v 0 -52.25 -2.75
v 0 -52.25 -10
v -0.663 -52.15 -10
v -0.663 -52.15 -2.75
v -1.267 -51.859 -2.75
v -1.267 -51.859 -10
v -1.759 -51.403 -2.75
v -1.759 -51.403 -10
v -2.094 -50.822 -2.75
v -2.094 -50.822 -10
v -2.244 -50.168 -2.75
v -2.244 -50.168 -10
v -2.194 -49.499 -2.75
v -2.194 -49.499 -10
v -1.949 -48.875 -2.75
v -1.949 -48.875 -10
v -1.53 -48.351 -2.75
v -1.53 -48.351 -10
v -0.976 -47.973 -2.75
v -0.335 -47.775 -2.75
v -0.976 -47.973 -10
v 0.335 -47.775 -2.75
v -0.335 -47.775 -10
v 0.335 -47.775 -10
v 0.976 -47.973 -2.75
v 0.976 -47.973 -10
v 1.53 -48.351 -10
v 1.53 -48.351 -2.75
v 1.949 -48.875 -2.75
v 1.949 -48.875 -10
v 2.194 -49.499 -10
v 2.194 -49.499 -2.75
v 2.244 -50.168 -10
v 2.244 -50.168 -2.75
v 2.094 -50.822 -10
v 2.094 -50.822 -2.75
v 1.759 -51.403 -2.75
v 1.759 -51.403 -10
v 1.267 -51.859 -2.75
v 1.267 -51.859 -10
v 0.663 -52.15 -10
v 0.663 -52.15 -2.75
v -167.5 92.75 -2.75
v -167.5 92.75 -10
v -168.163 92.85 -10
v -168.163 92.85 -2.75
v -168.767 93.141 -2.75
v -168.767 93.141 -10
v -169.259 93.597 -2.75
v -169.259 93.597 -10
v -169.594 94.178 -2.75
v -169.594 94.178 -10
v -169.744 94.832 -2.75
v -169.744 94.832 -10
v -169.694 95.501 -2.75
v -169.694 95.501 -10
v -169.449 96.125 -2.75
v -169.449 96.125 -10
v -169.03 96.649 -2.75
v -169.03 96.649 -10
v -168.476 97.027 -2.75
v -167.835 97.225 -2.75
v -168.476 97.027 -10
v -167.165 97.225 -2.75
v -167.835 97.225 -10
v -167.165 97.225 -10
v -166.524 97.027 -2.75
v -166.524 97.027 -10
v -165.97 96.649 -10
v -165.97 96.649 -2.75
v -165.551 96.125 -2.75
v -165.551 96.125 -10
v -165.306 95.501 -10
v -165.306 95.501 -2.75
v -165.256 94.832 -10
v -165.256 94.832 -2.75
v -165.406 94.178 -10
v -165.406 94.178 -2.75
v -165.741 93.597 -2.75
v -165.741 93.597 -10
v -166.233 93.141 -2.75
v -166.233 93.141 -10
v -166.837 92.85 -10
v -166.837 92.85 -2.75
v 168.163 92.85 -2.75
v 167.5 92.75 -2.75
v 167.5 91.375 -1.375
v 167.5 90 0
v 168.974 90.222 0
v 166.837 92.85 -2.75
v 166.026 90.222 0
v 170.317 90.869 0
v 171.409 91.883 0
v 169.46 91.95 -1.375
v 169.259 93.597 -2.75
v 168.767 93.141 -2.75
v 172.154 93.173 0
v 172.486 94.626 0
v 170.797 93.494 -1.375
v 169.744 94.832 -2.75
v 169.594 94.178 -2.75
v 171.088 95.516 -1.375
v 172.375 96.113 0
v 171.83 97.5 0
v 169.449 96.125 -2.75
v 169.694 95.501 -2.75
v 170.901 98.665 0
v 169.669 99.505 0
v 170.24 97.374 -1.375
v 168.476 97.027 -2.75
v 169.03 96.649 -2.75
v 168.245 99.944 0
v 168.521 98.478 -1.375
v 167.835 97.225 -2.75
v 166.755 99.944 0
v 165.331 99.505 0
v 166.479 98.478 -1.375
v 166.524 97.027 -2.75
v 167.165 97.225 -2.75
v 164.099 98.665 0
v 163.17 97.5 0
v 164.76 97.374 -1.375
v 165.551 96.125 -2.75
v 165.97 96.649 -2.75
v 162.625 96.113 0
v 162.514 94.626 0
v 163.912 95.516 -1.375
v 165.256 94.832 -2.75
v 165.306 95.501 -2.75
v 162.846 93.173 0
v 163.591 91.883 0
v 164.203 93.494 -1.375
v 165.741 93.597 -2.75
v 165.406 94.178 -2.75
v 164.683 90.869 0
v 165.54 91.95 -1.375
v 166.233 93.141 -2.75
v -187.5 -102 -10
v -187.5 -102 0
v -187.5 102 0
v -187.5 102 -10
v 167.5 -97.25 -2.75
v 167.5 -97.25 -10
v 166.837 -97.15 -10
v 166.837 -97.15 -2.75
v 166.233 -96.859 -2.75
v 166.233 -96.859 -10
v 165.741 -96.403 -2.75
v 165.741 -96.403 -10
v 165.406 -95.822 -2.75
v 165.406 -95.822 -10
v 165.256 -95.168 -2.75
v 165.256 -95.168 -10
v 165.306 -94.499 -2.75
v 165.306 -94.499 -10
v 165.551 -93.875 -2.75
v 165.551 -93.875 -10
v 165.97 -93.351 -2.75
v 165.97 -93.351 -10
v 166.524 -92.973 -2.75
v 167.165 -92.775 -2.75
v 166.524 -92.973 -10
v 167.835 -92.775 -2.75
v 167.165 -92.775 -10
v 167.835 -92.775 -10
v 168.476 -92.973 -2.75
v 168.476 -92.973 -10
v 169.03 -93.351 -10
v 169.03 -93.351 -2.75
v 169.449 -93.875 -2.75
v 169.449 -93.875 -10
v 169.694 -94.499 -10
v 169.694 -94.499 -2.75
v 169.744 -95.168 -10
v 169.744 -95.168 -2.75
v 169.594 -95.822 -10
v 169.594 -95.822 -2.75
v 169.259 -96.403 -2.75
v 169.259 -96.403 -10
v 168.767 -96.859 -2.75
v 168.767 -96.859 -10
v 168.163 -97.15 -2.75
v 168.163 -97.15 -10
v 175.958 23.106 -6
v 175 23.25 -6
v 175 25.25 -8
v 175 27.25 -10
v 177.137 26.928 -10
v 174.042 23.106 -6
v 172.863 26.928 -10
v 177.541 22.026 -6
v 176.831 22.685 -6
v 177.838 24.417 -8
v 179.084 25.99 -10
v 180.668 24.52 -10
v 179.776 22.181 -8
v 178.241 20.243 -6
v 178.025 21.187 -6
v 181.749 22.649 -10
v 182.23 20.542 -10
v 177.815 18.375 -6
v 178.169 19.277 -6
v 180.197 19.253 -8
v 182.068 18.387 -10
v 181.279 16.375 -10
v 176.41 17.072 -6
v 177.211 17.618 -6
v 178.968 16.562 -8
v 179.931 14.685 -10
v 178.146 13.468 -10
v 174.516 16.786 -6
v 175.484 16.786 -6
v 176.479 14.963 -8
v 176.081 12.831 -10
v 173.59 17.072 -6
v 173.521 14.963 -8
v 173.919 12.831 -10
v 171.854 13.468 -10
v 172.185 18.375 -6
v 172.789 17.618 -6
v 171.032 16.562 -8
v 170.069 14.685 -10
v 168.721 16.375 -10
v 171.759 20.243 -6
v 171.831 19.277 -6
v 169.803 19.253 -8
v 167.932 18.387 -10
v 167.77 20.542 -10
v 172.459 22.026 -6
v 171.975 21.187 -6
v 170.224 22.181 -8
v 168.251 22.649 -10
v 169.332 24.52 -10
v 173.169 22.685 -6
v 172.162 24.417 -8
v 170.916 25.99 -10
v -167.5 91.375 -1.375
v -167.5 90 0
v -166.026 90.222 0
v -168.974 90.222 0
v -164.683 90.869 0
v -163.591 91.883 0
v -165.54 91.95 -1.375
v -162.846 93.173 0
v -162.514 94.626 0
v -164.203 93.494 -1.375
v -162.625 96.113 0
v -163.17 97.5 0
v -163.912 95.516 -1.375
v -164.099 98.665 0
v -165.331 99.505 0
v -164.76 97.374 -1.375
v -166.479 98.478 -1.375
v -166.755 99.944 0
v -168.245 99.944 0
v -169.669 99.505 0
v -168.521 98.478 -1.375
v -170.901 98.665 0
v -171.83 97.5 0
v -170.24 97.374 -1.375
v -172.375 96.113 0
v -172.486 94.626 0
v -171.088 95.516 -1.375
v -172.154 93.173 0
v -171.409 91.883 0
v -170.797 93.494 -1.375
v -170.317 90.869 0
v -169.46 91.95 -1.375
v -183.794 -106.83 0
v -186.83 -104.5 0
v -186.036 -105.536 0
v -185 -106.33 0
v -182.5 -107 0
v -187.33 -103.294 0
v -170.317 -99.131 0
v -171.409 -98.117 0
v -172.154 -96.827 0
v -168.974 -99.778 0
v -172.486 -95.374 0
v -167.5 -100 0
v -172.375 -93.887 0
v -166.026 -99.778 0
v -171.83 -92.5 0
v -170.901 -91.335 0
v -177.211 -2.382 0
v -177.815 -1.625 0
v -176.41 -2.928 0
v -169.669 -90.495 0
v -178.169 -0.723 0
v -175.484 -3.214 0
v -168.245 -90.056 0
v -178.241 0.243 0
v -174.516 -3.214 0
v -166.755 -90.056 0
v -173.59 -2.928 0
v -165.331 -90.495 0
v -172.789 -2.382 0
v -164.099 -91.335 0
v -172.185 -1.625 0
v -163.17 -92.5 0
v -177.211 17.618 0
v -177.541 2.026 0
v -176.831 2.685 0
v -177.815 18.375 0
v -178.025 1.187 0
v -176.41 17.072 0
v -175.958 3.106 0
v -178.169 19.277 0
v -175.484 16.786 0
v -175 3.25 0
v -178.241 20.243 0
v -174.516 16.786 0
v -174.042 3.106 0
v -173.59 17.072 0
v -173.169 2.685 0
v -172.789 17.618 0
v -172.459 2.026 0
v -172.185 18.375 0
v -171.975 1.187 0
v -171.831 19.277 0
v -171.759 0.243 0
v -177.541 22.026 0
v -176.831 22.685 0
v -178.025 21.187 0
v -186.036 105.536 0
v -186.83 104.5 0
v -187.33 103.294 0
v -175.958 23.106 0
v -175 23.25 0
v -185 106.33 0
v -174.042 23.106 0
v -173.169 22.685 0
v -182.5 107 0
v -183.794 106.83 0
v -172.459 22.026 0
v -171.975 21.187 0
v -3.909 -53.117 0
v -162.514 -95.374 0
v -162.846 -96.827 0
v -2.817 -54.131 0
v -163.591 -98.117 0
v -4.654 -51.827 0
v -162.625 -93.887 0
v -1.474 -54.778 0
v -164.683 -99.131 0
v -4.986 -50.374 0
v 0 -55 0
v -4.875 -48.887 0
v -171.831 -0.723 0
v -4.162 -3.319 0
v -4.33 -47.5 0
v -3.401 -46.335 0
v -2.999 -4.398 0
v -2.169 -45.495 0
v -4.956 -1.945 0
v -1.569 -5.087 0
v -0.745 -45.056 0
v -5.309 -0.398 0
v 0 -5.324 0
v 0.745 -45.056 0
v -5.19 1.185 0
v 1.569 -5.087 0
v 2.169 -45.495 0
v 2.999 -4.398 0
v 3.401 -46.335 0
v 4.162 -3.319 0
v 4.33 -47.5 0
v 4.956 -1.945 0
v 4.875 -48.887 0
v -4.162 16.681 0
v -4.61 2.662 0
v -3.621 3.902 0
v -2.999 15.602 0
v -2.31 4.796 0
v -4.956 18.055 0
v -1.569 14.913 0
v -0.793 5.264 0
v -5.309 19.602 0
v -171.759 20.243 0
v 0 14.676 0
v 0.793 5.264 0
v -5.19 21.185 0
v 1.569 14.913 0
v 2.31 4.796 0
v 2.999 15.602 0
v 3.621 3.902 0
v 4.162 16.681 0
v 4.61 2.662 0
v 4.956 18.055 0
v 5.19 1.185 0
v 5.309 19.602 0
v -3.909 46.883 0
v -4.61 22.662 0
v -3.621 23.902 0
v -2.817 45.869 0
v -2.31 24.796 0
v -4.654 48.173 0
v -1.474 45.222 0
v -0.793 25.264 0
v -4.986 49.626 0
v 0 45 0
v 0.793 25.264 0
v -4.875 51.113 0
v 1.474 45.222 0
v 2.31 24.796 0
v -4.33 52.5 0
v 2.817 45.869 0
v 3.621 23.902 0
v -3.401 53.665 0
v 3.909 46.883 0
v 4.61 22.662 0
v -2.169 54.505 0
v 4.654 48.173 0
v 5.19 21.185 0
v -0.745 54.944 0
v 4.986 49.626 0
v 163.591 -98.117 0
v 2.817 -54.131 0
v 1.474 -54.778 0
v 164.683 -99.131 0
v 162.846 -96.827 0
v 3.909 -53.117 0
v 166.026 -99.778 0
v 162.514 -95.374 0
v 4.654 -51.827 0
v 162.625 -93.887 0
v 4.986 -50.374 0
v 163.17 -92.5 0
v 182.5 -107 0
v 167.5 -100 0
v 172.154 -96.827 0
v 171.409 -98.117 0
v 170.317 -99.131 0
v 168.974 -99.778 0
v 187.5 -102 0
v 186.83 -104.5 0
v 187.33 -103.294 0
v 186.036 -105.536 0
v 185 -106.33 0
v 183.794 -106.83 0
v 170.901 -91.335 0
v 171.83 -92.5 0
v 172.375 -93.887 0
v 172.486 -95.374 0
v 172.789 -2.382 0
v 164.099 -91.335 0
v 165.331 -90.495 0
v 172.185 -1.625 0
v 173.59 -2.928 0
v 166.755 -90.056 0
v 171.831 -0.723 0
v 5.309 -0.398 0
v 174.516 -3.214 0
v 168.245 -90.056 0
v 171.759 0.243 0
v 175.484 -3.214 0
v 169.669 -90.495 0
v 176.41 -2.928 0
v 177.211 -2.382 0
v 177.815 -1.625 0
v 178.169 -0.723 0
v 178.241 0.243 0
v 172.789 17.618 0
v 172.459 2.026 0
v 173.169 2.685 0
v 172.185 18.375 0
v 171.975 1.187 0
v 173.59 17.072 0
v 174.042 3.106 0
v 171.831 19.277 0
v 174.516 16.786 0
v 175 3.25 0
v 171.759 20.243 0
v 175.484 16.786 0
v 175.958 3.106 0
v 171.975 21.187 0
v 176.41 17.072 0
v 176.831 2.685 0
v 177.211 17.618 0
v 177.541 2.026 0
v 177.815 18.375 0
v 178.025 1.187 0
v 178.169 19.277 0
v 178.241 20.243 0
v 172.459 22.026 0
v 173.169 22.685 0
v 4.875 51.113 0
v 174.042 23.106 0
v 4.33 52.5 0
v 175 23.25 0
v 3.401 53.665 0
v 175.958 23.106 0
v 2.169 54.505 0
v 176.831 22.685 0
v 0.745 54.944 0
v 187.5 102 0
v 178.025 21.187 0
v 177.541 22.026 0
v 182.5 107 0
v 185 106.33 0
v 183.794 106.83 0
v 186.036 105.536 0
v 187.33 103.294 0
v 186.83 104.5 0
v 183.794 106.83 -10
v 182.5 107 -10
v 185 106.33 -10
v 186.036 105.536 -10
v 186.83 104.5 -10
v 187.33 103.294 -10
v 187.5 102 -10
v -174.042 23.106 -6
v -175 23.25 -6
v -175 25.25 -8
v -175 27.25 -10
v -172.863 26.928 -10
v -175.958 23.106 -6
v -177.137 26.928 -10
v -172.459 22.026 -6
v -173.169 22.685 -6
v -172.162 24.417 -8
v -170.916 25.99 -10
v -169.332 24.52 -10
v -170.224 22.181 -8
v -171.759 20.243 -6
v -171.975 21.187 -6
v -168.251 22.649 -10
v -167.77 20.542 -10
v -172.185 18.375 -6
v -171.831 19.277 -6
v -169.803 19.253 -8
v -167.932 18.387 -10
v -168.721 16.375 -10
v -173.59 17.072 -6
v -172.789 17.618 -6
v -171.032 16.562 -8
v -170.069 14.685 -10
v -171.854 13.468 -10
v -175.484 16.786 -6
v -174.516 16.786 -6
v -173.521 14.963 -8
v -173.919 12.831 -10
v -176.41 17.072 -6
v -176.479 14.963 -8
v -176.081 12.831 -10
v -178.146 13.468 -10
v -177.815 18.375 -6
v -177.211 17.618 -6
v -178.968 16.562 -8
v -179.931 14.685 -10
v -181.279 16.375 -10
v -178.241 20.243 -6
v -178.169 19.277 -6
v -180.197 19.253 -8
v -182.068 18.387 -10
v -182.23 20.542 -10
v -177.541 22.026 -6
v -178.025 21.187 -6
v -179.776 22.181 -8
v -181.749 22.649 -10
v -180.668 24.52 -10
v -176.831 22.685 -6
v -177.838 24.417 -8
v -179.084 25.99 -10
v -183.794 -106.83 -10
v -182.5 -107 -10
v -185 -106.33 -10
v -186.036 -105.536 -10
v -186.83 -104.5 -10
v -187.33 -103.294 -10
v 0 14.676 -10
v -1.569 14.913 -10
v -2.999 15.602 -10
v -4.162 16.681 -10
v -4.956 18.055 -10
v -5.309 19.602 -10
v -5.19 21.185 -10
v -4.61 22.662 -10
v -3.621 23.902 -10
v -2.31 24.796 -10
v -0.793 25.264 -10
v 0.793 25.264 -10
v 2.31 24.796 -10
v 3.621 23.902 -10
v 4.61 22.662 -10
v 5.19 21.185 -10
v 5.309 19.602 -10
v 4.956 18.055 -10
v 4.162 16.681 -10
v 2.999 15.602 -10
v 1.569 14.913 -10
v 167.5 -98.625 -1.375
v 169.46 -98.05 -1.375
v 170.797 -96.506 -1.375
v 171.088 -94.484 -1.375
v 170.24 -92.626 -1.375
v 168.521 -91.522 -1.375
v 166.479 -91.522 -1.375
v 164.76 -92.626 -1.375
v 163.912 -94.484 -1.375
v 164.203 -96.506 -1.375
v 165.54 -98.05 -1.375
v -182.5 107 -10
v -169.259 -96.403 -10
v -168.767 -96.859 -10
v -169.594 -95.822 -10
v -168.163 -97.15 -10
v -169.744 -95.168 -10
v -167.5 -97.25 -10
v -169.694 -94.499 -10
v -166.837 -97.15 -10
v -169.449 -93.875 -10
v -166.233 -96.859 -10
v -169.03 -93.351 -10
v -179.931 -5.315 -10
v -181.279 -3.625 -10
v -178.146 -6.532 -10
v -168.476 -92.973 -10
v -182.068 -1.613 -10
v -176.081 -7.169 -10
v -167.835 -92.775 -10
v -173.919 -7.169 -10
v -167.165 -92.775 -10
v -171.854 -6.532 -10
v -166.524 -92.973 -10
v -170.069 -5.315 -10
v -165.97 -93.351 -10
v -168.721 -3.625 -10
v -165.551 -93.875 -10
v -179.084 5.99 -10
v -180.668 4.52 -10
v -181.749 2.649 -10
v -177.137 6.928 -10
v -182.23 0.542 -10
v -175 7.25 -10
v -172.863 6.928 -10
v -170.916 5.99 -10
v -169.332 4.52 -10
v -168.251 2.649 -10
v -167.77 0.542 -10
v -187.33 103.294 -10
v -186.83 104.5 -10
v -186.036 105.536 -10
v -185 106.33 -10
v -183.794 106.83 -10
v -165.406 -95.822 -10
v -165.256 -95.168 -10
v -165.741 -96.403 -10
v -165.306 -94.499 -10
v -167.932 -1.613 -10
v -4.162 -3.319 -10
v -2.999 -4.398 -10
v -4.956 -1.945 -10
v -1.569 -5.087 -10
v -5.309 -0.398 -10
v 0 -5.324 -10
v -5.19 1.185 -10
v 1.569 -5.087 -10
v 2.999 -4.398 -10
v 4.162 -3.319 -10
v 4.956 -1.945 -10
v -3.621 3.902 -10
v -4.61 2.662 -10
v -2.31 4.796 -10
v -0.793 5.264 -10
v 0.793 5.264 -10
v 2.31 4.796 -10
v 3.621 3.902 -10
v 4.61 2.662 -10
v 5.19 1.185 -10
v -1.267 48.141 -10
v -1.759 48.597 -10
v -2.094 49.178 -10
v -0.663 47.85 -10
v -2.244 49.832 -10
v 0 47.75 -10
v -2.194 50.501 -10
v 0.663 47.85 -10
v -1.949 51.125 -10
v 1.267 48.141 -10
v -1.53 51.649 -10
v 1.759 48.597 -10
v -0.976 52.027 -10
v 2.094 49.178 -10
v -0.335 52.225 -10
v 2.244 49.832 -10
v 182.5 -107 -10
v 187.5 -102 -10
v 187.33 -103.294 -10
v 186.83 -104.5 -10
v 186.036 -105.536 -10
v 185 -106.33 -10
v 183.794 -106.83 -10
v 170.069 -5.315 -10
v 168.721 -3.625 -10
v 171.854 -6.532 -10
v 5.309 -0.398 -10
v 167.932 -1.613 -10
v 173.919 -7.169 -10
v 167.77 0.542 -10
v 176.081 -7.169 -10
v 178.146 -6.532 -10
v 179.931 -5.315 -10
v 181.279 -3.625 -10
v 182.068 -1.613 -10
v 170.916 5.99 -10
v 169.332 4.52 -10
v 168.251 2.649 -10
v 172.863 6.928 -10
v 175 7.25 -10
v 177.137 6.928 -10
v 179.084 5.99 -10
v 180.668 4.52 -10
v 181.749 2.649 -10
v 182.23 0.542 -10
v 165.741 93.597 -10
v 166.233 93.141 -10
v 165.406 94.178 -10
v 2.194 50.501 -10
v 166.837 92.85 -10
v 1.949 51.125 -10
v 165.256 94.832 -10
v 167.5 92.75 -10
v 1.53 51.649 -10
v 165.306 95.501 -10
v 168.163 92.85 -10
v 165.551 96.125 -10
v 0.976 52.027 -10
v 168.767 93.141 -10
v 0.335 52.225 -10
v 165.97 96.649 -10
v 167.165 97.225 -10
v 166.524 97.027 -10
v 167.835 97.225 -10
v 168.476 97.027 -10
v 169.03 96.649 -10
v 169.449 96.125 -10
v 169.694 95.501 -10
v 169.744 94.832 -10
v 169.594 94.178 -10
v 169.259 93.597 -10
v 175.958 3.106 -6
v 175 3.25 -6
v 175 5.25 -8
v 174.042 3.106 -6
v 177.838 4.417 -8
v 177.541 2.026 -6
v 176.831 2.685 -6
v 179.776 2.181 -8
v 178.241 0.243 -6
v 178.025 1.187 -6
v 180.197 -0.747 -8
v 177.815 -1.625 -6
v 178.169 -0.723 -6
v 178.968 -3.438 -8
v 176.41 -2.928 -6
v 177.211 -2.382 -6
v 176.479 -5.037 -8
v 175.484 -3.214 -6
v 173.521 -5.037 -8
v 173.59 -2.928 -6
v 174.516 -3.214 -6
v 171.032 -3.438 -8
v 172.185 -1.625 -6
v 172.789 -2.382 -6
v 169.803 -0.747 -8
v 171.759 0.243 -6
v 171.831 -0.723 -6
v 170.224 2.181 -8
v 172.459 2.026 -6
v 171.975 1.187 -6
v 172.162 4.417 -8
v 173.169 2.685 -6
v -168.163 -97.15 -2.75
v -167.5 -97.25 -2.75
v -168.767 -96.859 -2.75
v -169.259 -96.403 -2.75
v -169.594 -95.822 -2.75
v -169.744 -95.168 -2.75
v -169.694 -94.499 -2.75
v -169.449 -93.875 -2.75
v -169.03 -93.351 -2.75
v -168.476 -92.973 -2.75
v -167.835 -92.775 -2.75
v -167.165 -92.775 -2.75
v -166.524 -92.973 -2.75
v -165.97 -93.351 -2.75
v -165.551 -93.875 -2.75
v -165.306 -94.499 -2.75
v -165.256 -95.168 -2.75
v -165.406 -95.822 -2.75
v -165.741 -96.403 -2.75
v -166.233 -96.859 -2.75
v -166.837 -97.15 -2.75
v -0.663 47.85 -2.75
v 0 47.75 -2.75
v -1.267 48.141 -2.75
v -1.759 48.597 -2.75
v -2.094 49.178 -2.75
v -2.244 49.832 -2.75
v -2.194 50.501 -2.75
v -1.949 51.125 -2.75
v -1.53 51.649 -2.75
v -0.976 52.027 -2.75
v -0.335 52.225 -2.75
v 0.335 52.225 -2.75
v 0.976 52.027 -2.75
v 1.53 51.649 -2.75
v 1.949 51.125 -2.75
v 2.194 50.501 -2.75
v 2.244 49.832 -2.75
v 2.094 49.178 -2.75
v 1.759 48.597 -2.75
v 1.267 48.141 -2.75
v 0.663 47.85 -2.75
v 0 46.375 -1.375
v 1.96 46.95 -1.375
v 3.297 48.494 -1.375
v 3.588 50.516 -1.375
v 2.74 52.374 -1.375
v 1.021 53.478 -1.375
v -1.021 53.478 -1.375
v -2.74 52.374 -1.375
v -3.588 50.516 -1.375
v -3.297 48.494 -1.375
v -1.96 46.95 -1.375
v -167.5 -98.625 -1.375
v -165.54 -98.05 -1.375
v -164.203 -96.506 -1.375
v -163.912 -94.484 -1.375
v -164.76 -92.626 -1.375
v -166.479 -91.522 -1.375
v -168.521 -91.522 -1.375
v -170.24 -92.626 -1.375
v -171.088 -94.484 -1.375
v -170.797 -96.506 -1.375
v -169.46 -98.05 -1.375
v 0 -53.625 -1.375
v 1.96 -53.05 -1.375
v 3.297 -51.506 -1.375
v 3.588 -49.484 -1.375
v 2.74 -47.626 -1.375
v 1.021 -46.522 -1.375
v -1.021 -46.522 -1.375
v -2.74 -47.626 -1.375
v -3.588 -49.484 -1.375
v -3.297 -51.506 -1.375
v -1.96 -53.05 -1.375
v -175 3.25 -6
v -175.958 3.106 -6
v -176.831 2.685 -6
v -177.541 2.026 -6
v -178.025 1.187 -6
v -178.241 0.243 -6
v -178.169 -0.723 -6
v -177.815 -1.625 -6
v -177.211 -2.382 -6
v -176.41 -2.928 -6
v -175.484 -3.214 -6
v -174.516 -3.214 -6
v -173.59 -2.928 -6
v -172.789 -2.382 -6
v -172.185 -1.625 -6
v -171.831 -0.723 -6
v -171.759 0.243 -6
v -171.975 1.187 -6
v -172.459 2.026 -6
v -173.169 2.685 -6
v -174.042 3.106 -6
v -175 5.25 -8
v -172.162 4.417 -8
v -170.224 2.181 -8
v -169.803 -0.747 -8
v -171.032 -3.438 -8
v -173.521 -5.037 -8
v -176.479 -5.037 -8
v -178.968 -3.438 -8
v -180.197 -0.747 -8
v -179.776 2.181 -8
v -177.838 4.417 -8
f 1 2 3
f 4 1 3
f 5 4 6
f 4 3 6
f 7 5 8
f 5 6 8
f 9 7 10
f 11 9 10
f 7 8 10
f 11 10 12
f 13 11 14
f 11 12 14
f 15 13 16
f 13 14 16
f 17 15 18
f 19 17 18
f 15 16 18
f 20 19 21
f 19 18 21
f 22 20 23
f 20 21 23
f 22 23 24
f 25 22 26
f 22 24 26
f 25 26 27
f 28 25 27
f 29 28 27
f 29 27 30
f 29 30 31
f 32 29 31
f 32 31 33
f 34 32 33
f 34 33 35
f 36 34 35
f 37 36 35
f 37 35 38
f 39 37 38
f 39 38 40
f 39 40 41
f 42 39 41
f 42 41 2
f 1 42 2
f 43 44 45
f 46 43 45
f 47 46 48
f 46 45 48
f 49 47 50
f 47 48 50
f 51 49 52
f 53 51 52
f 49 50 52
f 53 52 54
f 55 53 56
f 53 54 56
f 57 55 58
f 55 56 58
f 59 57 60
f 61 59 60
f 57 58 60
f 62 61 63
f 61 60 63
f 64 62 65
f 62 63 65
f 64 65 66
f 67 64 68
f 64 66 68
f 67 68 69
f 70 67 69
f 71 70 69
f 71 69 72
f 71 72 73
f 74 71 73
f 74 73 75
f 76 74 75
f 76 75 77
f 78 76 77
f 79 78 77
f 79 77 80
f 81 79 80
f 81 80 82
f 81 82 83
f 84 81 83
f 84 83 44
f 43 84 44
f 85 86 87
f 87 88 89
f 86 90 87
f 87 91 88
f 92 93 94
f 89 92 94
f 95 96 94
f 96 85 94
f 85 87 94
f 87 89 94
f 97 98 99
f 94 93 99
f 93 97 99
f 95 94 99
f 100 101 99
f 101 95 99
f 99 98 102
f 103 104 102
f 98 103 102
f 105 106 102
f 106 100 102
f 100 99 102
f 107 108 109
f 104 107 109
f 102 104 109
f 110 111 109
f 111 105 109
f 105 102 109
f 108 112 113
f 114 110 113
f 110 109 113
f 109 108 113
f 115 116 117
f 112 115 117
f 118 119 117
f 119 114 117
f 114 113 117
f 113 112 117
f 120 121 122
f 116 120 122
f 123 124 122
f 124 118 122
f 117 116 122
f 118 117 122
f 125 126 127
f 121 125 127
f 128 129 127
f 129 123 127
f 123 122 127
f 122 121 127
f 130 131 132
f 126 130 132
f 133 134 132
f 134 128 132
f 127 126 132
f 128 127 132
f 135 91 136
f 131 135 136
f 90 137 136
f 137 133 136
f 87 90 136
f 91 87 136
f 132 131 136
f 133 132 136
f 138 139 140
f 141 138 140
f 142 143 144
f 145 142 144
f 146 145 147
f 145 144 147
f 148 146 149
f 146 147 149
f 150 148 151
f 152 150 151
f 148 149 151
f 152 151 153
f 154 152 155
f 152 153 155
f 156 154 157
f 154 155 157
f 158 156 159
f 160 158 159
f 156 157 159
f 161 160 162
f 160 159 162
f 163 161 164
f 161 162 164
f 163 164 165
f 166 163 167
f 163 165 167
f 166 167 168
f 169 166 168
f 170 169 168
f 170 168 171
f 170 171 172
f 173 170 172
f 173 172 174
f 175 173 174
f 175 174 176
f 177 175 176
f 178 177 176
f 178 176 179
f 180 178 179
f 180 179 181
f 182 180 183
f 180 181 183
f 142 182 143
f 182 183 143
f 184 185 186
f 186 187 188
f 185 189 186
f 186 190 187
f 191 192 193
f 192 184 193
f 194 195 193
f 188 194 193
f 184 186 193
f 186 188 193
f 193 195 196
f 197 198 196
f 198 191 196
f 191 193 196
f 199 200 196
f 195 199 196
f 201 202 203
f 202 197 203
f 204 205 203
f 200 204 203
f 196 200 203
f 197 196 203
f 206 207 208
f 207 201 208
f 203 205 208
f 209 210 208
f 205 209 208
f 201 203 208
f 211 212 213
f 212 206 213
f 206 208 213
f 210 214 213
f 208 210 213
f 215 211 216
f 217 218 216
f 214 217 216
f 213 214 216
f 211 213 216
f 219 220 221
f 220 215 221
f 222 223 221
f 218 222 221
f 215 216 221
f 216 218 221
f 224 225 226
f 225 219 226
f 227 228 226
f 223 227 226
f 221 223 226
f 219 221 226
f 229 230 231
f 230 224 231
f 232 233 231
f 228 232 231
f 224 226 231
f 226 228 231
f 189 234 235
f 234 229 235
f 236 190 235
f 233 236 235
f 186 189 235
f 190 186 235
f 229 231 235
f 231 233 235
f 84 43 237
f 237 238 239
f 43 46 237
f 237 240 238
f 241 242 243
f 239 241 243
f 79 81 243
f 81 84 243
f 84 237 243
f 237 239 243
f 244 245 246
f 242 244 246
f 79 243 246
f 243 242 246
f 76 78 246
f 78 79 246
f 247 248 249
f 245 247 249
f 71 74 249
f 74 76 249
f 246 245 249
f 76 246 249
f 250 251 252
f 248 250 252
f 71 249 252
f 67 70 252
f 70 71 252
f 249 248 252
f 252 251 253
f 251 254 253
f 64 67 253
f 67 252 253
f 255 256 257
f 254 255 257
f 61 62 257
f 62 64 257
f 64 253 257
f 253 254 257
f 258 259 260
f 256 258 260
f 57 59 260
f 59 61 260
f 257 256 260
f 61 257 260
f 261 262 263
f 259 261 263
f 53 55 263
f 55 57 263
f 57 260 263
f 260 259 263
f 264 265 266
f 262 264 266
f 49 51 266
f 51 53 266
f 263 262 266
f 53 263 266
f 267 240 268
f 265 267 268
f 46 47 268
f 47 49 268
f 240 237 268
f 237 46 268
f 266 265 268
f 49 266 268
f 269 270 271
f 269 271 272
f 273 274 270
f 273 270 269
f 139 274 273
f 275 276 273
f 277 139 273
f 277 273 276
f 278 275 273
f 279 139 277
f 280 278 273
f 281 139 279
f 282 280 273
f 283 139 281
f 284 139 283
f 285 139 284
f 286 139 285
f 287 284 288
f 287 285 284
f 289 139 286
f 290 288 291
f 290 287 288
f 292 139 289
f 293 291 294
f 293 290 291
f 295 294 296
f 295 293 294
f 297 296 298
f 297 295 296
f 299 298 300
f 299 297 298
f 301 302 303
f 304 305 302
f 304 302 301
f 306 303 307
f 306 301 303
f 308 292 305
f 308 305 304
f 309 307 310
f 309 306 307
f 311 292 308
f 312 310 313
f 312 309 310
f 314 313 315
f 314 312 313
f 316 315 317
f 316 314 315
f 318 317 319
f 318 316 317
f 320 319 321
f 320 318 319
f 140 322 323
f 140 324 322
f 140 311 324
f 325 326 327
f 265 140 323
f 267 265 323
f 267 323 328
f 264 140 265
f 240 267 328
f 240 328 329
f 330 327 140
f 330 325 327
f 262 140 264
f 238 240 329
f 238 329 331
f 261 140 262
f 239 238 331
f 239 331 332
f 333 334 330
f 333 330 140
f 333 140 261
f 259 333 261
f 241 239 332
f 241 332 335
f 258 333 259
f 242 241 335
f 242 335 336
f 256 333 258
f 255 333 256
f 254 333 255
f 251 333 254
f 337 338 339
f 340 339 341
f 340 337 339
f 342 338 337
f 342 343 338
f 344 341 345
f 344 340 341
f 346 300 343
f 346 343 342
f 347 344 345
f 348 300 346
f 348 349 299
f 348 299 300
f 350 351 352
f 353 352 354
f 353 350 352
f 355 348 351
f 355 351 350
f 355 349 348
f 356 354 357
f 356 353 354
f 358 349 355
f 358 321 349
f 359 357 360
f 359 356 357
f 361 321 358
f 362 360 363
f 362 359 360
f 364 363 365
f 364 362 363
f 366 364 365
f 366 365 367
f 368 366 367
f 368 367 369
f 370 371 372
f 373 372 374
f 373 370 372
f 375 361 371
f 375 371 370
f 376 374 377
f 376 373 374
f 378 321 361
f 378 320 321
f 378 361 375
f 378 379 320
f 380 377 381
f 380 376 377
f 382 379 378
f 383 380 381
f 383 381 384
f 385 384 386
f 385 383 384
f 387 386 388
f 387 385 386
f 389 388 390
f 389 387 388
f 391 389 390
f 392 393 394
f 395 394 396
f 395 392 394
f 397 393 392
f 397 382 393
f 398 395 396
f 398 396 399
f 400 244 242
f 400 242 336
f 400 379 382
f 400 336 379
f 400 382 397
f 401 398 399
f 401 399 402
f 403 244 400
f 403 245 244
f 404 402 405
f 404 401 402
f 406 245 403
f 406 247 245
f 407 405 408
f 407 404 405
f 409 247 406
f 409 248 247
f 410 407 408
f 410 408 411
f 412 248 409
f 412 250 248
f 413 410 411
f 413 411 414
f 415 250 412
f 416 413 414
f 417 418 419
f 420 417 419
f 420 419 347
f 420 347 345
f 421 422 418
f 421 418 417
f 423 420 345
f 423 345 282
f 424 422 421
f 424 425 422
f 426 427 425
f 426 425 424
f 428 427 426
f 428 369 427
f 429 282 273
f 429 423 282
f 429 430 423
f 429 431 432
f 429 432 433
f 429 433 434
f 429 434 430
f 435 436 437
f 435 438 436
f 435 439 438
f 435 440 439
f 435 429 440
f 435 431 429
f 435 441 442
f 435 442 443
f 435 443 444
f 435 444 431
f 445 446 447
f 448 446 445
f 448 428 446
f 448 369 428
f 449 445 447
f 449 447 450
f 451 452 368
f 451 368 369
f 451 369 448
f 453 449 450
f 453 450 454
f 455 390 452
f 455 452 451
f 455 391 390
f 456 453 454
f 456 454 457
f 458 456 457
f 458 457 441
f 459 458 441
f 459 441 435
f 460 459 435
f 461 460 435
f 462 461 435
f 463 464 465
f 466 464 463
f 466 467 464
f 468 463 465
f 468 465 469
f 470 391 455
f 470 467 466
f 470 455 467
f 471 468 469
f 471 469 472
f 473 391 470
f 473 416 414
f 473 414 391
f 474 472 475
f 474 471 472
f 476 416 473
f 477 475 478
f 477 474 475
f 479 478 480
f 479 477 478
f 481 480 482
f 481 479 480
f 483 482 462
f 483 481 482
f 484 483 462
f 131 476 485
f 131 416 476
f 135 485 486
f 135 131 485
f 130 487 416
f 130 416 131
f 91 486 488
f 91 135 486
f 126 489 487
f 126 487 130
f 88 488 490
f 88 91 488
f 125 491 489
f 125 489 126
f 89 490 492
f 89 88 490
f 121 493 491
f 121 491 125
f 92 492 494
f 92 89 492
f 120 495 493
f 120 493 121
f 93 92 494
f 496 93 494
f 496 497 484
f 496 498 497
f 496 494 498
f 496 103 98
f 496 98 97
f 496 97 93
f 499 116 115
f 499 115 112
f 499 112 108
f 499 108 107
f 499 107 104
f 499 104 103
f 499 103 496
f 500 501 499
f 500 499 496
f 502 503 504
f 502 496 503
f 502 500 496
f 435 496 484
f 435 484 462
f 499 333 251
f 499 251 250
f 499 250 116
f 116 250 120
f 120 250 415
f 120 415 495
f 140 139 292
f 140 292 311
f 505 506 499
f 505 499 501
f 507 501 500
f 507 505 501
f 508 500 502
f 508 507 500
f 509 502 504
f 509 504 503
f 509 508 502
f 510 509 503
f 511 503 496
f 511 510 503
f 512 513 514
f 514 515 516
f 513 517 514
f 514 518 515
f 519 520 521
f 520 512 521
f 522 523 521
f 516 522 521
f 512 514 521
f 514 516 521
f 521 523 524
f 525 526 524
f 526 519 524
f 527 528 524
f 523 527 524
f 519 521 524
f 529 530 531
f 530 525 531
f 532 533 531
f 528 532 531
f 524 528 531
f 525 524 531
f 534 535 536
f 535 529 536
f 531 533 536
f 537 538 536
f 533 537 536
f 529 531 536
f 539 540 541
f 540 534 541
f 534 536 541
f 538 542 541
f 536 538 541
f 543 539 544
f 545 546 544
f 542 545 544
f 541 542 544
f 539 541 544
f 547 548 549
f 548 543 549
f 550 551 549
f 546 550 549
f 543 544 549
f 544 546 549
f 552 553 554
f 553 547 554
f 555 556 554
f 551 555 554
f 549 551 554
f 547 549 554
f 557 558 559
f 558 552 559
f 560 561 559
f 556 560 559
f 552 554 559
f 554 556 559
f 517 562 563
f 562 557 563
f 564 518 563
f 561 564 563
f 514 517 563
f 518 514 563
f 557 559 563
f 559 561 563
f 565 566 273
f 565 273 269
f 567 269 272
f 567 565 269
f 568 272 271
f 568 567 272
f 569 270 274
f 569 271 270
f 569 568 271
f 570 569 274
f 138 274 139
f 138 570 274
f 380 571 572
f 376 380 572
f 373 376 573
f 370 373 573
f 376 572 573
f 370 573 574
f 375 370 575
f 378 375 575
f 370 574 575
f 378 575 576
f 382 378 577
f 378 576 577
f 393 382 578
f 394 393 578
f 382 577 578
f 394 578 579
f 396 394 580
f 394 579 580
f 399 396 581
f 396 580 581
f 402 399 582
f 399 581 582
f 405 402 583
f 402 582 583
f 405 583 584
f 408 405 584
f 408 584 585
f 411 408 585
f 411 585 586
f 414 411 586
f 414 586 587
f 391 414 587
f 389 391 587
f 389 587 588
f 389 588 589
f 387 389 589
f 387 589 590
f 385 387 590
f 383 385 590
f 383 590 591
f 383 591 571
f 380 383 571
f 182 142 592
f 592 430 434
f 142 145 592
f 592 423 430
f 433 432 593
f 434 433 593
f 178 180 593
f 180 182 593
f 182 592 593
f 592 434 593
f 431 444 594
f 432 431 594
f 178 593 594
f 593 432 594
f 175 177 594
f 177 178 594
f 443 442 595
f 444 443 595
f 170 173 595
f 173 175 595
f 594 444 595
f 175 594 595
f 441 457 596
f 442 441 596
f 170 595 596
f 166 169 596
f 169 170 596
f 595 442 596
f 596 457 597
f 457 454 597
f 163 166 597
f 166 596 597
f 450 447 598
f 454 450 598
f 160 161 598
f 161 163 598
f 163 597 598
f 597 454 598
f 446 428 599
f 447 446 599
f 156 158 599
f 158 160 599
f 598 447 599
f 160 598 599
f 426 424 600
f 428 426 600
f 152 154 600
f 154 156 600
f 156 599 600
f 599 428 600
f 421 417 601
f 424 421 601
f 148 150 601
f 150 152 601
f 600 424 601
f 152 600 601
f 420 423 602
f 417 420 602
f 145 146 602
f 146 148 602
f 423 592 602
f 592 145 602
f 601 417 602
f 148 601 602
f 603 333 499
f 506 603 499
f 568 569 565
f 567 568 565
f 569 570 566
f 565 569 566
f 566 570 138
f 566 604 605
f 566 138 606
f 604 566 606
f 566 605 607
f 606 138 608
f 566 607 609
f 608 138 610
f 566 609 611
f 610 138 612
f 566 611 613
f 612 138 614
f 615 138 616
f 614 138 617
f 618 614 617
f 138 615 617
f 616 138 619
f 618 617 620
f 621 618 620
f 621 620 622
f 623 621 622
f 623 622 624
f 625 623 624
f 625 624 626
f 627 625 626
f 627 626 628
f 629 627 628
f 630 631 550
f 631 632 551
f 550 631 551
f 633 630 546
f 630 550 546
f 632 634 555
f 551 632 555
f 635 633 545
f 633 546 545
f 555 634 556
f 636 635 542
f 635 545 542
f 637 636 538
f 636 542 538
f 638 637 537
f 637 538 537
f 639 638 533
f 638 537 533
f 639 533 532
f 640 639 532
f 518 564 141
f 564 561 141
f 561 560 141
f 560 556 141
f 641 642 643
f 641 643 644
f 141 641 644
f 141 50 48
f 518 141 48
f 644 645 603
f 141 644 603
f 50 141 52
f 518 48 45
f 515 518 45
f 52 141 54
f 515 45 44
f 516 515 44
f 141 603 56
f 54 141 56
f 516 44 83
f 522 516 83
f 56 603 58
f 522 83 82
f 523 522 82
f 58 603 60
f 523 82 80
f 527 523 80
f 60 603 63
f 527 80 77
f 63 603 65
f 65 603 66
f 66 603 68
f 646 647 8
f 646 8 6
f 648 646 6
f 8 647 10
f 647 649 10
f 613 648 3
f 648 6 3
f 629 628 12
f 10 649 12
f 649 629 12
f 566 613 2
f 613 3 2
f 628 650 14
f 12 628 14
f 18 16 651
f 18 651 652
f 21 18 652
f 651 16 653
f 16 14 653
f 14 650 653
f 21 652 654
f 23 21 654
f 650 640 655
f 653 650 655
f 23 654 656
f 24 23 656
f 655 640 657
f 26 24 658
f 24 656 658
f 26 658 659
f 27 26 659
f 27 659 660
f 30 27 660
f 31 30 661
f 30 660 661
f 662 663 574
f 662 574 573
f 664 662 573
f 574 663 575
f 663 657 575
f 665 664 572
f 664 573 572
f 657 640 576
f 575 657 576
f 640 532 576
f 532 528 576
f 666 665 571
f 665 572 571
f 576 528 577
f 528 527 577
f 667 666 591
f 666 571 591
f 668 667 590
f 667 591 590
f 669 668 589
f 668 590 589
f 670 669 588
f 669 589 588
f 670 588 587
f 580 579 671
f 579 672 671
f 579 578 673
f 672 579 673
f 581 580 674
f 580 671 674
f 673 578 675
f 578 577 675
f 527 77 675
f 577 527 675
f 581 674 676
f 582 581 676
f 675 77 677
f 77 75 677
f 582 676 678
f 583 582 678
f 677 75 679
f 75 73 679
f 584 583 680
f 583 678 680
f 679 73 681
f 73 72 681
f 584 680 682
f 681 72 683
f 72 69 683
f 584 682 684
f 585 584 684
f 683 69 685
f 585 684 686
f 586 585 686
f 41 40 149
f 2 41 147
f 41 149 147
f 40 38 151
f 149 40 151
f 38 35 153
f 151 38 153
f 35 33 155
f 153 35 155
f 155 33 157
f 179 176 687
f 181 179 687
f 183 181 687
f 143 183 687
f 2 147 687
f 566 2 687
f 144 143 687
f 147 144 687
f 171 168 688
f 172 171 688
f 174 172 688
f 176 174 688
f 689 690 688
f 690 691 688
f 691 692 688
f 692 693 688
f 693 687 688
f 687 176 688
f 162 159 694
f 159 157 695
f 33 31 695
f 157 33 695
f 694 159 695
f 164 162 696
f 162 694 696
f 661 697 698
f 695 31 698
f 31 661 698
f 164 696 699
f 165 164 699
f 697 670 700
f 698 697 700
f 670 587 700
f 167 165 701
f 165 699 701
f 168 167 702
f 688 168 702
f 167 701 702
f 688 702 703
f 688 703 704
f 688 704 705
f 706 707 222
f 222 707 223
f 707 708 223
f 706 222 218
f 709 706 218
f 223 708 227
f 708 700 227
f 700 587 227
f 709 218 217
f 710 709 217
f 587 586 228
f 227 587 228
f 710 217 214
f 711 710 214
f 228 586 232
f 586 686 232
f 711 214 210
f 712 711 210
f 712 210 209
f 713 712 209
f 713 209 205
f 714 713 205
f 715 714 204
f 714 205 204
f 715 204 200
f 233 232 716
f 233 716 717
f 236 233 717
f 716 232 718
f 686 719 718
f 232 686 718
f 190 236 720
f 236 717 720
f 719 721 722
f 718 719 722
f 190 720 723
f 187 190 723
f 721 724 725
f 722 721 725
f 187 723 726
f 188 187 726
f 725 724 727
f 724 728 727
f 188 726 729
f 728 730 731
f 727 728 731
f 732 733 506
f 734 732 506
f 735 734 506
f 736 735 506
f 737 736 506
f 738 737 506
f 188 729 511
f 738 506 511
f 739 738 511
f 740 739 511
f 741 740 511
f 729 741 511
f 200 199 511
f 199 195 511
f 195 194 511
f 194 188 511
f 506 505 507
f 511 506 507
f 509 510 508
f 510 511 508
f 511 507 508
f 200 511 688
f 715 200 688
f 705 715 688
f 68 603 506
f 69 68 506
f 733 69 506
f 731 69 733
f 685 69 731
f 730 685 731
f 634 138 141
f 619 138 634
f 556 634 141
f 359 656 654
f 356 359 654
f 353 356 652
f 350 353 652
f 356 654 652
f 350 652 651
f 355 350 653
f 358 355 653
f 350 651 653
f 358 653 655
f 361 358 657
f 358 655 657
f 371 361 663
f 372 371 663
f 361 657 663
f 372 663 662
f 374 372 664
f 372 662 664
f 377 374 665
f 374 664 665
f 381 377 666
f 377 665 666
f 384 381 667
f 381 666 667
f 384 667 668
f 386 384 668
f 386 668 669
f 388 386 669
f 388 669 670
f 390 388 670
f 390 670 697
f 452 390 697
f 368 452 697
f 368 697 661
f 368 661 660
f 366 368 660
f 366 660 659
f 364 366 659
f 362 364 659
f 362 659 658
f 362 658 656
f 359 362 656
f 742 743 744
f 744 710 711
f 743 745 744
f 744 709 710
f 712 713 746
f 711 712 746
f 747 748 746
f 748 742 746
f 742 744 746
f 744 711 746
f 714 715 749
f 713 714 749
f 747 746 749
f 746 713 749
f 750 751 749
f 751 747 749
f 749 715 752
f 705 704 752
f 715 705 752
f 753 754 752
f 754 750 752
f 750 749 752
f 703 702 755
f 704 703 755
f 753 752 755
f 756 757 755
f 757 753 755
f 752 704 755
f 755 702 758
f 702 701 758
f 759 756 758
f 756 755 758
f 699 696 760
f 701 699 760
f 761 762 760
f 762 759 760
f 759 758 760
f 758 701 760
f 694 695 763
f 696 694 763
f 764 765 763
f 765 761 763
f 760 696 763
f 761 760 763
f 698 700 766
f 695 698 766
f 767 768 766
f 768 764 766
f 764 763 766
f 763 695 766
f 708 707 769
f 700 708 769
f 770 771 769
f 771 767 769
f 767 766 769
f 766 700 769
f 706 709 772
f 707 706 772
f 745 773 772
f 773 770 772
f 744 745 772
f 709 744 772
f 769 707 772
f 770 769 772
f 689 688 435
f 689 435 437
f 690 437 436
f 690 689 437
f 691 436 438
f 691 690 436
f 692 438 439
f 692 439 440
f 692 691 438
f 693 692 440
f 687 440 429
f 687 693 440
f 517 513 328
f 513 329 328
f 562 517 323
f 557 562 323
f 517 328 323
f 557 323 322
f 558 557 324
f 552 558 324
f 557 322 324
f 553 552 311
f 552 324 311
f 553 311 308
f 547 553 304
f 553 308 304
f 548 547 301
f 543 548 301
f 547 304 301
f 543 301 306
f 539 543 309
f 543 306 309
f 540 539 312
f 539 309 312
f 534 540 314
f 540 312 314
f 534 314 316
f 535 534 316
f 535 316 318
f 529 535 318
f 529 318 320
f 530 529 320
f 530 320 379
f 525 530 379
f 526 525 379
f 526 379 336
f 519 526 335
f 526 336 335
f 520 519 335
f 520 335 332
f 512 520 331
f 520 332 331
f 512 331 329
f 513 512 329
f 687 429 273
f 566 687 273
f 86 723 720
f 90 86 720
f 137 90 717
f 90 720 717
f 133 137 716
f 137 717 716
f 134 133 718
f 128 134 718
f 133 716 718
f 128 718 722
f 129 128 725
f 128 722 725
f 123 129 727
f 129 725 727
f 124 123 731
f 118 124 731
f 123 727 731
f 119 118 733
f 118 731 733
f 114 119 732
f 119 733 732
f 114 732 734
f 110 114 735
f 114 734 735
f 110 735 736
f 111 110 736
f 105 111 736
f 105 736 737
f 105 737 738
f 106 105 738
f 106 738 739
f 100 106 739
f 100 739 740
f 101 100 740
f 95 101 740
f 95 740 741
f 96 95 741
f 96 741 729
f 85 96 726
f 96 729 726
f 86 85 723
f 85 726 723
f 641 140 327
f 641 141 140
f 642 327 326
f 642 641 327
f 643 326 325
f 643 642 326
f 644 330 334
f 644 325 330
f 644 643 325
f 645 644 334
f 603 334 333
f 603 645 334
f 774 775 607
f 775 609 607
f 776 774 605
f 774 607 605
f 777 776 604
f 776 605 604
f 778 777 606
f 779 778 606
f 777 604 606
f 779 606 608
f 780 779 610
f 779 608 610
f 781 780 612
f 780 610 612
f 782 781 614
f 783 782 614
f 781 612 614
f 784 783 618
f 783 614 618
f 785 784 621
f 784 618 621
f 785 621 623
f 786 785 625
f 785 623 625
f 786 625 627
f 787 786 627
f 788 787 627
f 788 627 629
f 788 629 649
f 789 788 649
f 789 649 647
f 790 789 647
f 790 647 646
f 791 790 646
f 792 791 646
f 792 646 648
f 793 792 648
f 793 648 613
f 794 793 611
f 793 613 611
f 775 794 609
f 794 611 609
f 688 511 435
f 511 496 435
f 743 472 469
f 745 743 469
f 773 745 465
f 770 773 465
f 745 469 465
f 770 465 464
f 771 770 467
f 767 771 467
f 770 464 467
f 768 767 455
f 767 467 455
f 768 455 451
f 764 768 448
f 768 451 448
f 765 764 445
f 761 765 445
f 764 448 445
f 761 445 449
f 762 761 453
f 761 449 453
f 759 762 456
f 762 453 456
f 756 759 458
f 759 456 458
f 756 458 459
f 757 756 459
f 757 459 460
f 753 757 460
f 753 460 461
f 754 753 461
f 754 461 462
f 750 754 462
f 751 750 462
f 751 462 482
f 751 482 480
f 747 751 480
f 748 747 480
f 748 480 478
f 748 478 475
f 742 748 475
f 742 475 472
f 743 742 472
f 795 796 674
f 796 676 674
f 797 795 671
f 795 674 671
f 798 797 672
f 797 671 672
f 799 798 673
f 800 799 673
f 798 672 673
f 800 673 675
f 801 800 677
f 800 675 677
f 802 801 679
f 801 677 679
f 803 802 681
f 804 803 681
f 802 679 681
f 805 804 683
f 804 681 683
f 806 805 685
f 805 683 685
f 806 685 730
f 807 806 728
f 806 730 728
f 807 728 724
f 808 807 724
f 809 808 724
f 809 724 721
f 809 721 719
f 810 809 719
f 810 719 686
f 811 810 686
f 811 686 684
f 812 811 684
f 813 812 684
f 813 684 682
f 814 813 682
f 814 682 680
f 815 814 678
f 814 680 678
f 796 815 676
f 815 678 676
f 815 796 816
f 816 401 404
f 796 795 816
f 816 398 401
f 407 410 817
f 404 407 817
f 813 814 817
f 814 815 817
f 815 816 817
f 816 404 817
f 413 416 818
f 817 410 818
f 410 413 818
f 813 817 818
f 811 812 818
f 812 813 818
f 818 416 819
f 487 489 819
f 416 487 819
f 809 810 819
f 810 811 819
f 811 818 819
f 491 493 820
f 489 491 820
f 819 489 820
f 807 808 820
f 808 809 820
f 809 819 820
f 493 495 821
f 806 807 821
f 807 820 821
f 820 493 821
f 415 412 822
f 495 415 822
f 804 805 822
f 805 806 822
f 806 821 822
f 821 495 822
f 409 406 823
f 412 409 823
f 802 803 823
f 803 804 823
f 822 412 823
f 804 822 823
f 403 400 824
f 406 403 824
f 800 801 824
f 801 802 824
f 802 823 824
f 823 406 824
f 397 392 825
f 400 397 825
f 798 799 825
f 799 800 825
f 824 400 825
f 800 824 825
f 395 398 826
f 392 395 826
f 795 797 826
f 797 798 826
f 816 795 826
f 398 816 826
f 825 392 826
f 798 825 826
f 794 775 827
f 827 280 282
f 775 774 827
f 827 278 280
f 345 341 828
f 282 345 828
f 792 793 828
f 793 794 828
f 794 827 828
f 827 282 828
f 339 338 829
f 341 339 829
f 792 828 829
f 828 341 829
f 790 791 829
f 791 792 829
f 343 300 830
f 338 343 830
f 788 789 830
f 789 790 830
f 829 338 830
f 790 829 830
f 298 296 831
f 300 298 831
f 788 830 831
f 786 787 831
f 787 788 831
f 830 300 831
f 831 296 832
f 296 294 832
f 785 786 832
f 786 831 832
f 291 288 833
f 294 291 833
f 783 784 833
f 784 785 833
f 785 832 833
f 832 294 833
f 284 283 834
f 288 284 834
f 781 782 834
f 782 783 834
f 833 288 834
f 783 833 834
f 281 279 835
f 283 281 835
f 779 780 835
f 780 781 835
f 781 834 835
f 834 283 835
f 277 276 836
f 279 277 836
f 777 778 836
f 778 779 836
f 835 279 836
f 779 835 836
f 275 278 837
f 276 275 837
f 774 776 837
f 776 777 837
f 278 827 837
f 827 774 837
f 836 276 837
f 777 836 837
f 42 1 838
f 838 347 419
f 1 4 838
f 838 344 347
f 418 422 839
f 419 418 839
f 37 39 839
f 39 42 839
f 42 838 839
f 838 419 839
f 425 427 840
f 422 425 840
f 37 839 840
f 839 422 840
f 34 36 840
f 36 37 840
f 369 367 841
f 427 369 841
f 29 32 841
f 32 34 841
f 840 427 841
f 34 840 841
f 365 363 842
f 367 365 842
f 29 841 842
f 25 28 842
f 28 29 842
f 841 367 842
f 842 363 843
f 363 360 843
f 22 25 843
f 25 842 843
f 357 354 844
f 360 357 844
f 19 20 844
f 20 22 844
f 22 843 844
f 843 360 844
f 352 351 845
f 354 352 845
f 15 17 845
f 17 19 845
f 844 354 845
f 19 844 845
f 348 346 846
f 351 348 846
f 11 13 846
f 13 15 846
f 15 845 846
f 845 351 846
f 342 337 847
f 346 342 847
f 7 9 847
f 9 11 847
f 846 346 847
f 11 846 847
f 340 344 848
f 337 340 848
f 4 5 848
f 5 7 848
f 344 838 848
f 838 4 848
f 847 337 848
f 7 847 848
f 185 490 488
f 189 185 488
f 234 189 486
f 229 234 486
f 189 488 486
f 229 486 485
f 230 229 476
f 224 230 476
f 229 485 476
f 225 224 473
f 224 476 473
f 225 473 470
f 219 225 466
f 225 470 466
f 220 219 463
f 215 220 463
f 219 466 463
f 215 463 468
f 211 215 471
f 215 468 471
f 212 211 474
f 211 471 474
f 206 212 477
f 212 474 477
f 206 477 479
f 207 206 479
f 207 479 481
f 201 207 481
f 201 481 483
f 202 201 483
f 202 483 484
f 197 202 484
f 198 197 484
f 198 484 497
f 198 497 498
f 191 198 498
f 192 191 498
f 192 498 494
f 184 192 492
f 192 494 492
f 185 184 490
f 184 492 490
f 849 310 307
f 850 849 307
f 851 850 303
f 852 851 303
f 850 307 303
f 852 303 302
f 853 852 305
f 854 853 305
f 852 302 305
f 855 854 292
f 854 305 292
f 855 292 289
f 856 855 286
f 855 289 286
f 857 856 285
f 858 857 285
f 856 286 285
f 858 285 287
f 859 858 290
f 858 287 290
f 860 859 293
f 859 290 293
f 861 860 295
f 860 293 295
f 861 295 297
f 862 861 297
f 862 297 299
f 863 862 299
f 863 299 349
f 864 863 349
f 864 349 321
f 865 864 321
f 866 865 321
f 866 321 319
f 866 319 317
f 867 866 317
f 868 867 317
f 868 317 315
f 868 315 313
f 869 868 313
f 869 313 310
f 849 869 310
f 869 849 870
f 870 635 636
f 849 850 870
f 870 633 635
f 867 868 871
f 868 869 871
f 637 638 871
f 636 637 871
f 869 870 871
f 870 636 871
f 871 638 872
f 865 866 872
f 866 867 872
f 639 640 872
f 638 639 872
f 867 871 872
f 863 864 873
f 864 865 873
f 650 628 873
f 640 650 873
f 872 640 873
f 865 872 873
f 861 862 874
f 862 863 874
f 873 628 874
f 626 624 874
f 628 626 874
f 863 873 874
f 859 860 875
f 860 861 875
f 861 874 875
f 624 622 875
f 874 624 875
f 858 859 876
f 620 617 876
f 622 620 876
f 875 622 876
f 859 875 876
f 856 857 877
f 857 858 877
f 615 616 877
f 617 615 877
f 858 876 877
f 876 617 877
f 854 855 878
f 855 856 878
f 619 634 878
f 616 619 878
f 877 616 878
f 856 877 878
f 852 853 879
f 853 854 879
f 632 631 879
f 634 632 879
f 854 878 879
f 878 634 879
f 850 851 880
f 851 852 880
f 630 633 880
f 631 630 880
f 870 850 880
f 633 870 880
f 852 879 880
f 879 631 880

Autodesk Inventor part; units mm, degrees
ref_plane "YZ Plane" through (0, 0, 0) normal (1, 0, 0) x (0, 1, 0)
ref_plane "XZ Plane" through (0, 0, 0) normal (0, 1, 0) x (-1, 0, 0)
ref_plane "XY Plane" through (0, 0, 0) normal (0, 0, 1) x (1, 0, 0)
sketch "Sketch1" plane through (0, 0, 0) normal (0, 0, 1) x (1, 0, 0)
  line L0 (-262.5, 0) -> (262.5, 0) construction
  line L1 (0, -149.8) -> (0, 149.8) construction
  line L2 (-187.5, 107) -> (187.5, 107)
  line L3 (187.5, 107) -> (187.5, -107)
  line L4 (187.5, -107) -> (-187.5, -107)
  line L5 (-187.5, -107) -> (-187.5, 107)
  point P0 (-167.5, 95)
  point P1 (167.5, 95)
  point P2 (-167.5, -95)
  point P3 (167.5, -95)
  point P4 (0, 0)
  point P5 (-175, 0)
  point P6 (175, 0)
  point P7 (0, -50)
  point P8 (0, 50)
  point P9 (0, 20)
  point P10 (175, 20)
  point P11 (-175, 20)
  dimension "d0" = 375
  dimension "d1" = 214
  dimension "d3" = 335
  dimension "d30" = 20
  dimension "d45" = 12
  dimension "d46" = 190
  dimension "d47" = 100
  dimension "d48" = 12.5
  dimension "d52" = 20
extrude "Extrusion1" add sketch "Sketch1" against normal blind 10
hole "Hole1" at (-167.5, 95, 0) at (167.5, 95, 0) at (-167.5, -95, 0) at (167.5, -95, 0) at (0, -50, 0) at (0, 50, 0) direction (0, 0, -1) diameter 4.5 end through all countersink diameter 10 countersink angle 90 clearance for "Countersunk Flat Head Hex Socket Screw ISO 10642" size "M4" standard "ISO"
hole "Hole2" at (0, 0, 0) at (0, 20, 0) direction (0, 0, -1) diameter 10.647 end through all thread size "M12x1.25" class "6H" standard "ISO Metric profile"
sketch "Sketch2" plane through (0, 0, -10) normal (0, 0, -1) x (-1, 0, 0)
  point P0 (0, 0)
  point P1 (175, 0)
  point P2 (175, 0)
  point P3 (-175, 0)
  point P4 (-175, 0)
  point P5 (0, 20)
  point P6 (0, 0)
  point P7 (175, 20)
  point P8 (-175, 20)
hole "Hole4" at (-175, 0, -10) at (175, 0, -10) at (-175, 20, -10) at (175, 20, -10) direction (0, 0, 1) diameter 6.5 end through all countersink diameter 14.5 countersink angle 90 clearance for "Countersunk Flat Head Hex Socket Screw ISO 10642" size "M6" standard "ISO"
fillet "Arredondamento2" radius 5 4 edges at (187.5, -107, -5) (187.5, 107, -5) (-187.5, -107, -5) (-187.5, 107, -5)
properties part number "FCT-01-171A" material "Acrílico TP"
